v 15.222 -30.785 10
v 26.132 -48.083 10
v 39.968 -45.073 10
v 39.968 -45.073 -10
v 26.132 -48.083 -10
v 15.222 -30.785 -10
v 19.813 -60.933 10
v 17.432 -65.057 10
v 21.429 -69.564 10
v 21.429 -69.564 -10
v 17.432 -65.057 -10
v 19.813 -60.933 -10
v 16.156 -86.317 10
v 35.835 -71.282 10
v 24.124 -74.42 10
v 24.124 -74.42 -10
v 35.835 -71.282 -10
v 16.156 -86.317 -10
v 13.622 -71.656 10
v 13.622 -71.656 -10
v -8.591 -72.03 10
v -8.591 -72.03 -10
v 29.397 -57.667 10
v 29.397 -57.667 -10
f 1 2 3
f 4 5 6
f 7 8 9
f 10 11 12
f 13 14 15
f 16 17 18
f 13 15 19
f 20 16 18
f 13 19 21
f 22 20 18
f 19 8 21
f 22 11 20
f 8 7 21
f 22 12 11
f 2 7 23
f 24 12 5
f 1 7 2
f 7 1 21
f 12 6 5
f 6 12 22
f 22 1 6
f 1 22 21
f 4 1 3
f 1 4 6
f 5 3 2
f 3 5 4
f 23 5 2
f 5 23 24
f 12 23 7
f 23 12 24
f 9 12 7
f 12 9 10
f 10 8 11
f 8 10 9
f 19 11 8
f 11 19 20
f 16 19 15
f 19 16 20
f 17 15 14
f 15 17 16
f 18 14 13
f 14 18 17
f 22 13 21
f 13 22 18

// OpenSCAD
polyhedron(
    points=[
    [-8.59082408685966, -72.0297437973274, 10],
    [15.2216759131403, -30.7852839420936, 10],
    [39.9683518262807, -45.0727839420936, 10],
    [26.1320706581292, -48.0829259131403, 10],
    [29.3974342349666, -57.6671502928731, 10],
    [19.8132098552339, -60.9325138697105, 10],
    [21.428795037862, -69.5642382494432, 10],
    [17.4319598552339, -65.0569598552339, 10],
    [13.6219598552339, -71.6560734320713, 10],
    [24.1244910233854, -74.4201558407573, 10],
    [35.8347437973274, -71.2824030668152, 10],
    [16.1558518262807, -86.3172437973274, 10],
    [-8.59082408685966, -72.0297437973274, -10],
    [15.2216759131403, -30.7852839420936, -10],
    [39.9683518262807, -45.0727839420936, -10],
    [26.1320706581292, -48.0829259131403, -10],
    [29.3974342349666, -57.6671502928731, -10],
    [19.8132098552339, -60.9325138697105, -10],
    [21.428795037862, -69.5642382494432, -10],
    [17.4319598552339, -65.0569598552339, -10],
    [13.6219598552339, -71.6560734320713, -10],
    [24.1244910233854, -74.4201558407573, -10],
    [35.8347437973274, -71.2824030668152, -10],
    [16.1558518262807, -86.3172437973274, -10],
    ],
    faces=[
        [2,3,1],
        [13,15,14],
        [6,7,5],
        [17,19,18],
        [9,10,11],
        [23,22,21],
        [8,9,11],
        [23,21,20],
        [0,8,11],
        [23,20,12],
        [0,7,8],
        [20,19,12],
        [0,5,7],
        [19,17,12],
        [4,5,3],
        [15,17,16],
        [3,5,0,1],
        [13,12,17,15],
        [0,12,13,1],
        [1,13,14,2],
        [2,14,15,3],
        [3,15,16,4],
        [4,16,17,5],
        [5,17,18,6],
        [6,18,19,7],
        [7,19,20,8],
        [8,20,21,9],
        [9,21,22,10],
        [10,22,23,11],
        [11,23,12,0],
    ]
);
